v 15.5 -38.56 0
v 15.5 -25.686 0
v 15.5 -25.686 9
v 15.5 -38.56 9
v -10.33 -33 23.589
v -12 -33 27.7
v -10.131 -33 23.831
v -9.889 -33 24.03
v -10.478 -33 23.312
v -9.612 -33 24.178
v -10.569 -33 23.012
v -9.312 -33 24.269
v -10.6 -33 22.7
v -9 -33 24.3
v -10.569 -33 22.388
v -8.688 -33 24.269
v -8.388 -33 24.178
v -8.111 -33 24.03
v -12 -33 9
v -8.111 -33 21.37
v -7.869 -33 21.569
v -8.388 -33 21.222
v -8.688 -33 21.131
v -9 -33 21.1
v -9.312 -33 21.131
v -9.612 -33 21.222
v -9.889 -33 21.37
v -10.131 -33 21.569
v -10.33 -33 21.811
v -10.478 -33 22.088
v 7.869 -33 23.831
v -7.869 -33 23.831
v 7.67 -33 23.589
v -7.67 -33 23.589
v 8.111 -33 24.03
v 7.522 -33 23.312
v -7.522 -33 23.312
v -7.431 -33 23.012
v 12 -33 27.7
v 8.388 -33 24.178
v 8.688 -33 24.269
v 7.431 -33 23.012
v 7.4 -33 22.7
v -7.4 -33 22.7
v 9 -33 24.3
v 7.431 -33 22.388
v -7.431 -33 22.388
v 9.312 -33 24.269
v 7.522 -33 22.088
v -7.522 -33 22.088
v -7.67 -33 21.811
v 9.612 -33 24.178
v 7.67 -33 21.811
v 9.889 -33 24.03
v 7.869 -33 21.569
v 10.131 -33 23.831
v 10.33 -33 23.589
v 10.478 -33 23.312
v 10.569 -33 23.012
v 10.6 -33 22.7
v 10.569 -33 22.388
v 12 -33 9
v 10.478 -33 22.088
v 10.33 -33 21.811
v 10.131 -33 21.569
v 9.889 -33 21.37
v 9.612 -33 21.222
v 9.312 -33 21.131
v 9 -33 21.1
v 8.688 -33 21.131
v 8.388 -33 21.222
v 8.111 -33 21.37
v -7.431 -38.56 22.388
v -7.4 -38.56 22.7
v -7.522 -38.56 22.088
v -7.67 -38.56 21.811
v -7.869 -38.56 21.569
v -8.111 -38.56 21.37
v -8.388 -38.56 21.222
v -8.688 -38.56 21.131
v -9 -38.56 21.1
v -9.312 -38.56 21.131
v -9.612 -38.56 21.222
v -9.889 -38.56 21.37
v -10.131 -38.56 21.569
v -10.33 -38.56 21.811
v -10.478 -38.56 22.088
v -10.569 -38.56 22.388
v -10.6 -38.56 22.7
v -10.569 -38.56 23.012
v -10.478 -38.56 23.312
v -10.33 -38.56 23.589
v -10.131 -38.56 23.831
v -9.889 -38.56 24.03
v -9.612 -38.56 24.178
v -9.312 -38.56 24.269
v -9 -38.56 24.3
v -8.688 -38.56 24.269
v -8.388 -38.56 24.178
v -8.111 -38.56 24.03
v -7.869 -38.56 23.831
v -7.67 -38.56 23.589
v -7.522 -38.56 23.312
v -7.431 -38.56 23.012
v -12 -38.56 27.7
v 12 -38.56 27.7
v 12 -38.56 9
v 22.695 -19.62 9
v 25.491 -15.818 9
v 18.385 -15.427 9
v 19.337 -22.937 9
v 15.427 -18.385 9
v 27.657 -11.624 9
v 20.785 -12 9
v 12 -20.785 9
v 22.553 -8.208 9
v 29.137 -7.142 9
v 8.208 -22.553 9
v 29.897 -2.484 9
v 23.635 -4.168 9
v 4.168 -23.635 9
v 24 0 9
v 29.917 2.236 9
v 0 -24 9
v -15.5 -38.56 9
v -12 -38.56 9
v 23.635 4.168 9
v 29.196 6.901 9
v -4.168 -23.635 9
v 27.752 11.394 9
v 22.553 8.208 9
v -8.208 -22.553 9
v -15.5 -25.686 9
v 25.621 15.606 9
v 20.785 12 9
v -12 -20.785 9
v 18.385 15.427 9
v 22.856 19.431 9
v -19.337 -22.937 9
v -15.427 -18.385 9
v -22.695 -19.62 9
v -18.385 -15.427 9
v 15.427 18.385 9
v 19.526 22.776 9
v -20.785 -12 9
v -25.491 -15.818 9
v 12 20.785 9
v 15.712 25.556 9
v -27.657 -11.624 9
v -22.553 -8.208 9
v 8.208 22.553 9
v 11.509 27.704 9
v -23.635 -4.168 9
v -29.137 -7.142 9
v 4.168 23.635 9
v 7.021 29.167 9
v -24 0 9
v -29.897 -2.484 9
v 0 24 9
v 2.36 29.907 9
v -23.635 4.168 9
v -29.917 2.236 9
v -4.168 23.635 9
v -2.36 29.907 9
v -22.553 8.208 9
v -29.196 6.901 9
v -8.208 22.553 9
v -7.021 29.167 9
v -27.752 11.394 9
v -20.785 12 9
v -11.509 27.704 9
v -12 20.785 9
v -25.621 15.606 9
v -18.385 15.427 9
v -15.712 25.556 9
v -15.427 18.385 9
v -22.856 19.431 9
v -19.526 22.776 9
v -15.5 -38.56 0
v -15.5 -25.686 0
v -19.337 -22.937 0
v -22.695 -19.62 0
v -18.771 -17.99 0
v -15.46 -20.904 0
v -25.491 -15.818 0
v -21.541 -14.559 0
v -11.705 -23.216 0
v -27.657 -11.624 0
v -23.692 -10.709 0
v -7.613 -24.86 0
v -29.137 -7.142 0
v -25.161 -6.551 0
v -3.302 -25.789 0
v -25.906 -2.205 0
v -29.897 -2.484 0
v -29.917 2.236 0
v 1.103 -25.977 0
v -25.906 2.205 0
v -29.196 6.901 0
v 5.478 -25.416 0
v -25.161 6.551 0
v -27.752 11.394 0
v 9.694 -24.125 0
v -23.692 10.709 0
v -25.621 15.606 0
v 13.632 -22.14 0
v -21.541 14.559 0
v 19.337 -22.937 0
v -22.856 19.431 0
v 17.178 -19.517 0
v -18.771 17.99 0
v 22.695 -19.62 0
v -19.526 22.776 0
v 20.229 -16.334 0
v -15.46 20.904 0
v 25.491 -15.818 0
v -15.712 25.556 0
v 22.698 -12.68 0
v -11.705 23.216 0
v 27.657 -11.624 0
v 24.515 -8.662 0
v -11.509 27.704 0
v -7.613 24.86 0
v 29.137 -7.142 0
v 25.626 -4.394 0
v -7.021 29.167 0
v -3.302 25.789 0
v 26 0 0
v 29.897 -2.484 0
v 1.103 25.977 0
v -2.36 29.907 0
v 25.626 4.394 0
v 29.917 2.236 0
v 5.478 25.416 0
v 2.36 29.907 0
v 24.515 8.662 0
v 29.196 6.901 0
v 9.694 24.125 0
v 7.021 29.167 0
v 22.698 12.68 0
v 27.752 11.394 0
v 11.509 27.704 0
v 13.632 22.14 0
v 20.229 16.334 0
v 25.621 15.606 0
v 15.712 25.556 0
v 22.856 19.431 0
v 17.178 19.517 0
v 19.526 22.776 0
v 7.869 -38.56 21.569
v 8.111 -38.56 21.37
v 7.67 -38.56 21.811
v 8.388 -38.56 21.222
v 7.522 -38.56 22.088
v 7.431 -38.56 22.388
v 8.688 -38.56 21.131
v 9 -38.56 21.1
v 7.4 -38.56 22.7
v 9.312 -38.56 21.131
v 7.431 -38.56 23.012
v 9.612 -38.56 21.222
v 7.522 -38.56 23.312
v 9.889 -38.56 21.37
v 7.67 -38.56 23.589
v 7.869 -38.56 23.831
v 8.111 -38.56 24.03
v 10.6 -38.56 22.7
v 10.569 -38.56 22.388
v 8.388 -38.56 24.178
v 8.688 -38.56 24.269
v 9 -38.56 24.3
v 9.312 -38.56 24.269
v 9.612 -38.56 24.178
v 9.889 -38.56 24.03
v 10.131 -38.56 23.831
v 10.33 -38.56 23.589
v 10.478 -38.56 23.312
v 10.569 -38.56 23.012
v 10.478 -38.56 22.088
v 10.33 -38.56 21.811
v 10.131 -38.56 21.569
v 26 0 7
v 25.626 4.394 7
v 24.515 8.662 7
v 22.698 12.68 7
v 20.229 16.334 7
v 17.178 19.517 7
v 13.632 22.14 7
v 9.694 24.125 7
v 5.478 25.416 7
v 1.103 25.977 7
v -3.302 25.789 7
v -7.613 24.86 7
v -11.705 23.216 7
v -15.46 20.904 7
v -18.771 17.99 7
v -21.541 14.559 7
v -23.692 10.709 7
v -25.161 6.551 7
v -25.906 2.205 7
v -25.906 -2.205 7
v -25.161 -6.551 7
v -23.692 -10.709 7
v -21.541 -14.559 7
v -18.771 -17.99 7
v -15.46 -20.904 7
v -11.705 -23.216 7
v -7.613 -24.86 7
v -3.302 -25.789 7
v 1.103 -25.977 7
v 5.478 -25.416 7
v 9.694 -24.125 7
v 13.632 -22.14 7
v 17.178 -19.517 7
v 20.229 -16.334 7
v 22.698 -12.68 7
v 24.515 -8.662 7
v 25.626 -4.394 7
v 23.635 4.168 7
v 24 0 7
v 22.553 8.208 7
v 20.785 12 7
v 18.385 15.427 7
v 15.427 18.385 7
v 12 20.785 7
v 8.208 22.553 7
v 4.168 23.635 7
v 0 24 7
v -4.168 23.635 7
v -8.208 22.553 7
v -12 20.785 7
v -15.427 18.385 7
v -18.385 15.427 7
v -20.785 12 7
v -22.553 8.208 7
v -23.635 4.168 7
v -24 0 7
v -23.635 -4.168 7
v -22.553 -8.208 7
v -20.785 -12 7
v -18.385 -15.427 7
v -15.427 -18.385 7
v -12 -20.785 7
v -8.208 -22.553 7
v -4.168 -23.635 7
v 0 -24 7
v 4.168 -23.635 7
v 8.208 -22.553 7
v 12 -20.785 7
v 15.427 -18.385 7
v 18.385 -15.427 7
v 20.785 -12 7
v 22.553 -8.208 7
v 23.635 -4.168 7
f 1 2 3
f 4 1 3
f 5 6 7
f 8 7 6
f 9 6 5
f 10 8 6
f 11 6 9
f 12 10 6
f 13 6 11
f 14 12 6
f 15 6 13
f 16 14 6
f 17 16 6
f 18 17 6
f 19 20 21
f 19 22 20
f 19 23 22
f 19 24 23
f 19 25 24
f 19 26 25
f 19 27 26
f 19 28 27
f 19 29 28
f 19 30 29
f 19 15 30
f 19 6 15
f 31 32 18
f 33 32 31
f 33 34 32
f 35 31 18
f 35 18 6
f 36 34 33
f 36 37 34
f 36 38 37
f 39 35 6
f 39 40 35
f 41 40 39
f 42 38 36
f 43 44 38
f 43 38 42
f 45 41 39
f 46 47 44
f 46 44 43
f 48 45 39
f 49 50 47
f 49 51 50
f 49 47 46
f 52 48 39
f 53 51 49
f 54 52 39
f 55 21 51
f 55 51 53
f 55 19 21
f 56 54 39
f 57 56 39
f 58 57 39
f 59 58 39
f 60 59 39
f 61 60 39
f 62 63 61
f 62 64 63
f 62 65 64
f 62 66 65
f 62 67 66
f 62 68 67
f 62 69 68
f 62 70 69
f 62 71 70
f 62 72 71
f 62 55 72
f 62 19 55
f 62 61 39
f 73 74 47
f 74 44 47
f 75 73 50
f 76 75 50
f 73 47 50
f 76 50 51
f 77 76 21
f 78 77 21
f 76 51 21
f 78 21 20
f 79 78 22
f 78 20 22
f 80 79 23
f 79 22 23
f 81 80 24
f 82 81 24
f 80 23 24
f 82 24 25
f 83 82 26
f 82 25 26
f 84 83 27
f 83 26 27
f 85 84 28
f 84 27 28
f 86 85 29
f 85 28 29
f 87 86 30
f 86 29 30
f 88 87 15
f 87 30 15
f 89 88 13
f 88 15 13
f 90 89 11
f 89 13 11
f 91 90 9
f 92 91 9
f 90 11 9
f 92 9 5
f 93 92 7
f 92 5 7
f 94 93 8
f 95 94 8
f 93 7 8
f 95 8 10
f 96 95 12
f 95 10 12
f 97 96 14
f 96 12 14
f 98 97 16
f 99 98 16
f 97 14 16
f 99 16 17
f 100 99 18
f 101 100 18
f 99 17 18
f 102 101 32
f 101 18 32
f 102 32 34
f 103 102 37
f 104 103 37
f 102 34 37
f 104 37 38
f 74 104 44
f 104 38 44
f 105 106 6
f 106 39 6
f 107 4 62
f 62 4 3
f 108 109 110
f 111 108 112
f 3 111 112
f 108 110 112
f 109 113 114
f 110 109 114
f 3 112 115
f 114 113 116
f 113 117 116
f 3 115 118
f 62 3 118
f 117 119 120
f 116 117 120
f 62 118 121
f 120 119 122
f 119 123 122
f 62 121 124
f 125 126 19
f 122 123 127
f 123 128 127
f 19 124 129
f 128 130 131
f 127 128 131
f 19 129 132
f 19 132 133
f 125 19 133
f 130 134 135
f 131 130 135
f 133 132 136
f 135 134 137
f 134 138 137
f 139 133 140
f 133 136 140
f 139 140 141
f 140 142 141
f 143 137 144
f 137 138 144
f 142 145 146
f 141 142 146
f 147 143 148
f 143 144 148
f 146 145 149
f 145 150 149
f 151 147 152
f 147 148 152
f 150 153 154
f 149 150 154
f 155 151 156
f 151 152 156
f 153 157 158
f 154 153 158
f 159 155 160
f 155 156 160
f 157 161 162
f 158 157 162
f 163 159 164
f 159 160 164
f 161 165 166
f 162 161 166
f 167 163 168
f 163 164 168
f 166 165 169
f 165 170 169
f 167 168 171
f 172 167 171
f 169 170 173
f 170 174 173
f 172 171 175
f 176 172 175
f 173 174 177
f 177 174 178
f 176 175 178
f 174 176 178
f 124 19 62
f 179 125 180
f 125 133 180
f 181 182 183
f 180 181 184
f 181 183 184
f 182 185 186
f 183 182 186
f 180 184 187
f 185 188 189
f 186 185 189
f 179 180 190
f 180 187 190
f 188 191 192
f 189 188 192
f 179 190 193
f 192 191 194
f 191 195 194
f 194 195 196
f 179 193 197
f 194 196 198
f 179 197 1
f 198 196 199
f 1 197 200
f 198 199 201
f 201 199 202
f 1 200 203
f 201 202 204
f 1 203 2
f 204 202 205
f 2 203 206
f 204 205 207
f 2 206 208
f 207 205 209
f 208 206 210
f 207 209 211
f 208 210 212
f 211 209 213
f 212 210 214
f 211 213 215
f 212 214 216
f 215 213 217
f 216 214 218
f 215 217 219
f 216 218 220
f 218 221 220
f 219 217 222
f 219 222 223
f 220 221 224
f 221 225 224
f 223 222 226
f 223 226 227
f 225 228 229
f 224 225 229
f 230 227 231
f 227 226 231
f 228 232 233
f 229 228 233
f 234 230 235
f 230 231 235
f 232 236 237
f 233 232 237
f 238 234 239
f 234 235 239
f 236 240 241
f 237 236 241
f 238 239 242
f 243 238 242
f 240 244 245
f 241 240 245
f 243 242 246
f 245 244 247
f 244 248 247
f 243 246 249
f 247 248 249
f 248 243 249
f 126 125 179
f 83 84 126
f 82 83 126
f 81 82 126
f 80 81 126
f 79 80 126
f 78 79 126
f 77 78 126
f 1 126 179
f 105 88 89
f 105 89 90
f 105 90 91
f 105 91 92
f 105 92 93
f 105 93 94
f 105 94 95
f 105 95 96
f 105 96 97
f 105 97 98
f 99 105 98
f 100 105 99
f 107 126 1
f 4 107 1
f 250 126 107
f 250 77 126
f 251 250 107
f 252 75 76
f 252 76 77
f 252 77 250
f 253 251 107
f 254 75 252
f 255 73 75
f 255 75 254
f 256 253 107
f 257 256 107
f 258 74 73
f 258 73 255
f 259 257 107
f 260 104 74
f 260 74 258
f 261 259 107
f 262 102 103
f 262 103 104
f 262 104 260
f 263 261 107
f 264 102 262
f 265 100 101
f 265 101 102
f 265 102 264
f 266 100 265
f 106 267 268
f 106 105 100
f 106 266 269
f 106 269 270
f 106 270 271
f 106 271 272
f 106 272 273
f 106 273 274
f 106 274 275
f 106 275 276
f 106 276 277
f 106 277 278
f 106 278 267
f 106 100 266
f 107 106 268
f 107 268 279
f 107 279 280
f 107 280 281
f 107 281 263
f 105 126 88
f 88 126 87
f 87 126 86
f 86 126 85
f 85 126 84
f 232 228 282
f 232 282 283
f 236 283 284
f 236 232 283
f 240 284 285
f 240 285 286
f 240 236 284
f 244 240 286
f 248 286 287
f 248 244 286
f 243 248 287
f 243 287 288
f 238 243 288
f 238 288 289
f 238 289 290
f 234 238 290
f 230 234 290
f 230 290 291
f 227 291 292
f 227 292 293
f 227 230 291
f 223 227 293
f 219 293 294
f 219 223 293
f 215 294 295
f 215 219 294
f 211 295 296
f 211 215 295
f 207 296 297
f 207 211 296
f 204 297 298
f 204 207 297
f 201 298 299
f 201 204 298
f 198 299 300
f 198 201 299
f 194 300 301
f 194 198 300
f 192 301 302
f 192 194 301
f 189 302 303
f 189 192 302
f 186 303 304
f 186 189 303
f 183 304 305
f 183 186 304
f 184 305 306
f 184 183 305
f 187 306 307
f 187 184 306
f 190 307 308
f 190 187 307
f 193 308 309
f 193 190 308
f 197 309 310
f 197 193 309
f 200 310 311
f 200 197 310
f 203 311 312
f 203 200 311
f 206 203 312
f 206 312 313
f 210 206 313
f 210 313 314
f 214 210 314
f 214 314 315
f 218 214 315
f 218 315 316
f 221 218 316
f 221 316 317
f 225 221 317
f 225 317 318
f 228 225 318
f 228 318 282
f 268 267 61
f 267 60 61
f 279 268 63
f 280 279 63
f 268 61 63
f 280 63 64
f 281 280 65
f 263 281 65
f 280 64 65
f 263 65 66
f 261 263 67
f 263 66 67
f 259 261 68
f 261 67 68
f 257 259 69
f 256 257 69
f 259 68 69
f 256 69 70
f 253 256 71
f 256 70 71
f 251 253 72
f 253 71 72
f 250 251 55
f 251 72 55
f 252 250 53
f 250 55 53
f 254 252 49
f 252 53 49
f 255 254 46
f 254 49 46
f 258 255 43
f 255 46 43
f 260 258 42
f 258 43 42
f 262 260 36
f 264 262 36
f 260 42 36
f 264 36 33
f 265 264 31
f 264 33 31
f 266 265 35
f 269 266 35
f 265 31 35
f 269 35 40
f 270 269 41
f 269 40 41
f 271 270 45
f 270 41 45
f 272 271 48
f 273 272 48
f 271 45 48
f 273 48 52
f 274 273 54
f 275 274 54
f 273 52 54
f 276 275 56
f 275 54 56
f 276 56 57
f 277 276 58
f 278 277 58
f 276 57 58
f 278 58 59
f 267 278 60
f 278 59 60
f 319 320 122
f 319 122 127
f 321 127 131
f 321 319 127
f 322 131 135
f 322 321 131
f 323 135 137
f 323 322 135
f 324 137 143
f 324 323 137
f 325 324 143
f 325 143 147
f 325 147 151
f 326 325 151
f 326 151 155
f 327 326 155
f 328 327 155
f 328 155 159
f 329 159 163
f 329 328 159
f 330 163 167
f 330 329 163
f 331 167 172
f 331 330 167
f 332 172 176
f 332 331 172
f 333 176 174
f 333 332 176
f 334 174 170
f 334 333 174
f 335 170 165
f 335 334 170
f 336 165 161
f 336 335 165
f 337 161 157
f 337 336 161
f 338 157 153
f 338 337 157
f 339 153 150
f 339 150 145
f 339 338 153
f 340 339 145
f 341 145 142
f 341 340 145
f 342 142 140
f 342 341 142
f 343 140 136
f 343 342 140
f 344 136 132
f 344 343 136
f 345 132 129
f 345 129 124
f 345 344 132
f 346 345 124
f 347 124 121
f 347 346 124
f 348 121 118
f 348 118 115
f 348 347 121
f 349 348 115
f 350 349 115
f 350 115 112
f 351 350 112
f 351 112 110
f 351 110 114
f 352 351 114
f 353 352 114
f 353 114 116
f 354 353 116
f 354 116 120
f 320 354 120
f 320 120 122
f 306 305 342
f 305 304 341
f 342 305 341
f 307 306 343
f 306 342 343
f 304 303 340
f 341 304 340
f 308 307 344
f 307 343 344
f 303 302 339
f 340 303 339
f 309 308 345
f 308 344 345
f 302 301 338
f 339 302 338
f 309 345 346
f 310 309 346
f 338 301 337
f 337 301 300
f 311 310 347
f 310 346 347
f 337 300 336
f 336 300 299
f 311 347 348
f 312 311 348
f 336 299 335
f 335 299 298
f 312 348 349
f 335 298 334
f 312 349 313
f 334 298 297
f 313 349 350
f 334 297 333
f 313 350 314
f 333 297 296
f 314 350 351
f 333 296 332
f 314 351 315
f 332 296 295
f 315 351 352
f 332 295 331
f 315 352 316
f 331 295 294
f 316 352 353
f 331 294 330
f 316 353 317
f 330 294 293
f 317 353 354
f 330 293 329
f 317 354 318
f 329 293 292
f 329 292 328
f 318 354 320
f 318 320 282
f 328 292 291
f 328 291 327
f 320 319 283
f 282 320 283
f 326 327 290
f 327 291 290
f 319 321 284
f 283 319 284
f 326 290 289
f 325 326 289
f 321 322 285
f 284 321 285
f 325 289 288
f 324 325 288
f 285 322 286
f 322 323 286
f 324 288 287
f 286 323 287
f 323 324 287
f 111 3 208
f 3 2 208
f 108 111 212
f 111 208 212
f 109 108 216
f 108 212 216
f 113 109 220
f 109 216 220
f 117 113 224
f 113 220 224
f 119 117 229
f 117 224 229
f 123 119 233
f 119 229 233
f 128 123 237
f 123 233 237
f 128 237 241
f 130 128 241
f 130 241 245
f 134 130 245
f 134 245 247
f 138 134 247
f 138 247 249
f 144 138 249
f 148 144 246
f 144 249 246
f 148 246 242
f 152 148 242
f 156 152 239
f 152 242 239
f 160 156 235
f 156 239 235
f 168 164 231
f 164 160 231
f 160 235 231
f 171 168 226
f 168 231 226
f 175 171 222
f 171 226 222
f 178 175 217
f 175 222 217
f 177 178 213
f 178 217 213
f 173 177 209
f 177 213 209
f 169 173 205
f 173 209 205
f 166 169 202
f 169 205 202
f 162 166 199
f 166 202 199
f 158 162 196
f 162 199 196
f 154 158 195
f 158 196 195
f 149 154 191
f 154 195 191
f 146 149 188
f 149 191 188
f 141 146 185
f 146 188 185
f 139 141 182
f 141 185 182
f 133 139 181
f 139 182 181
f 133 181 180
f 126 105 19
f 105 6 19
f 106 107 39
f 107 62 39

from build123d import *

# Parameters (mm, degrees)
SKETCH_1_R          = 26
EXTRUDE_1_DEPTH     = 7
SKETCH_4_R          = 30
SKETCH_4_R_2        = 24
EXTRUDE_4_DEPTH     = 2
SKETCH_5_W          = 24
SKETCH_5_H          = 5
EXTRUDE_5_DEPTH     = 20.7
EXTRUDE_8_DEPTH     = 2
SKETCH_9_R          = 1.6
CUT_EXTRUDE_1_DEPTH = 6
EXTRUDE_9_DEPTH     = 0.56
SKETCH_11_R         = 1.6
CUT_EXTRUDE_2_DEPTH = 25


with BuildPart() as part:
    # 草图1 → 凸台-拉伸1 (new body)
    with BuildSketch(Plane.XY):
        with BuildLine():
            Line((-15.5, -38), (15.5, -38))
            Line((15.5, -38), (15.5, -25.685599078))
            ThreePointArc((15.5, -25.685599078), (0, 30), (-15.5, -25.685599078))
            Line((-15.5, -25.685599078), (-15.5, -38))
        make_face()
        Circle(SKETCH_1_R, mode=Mode.SUBTRACT)
    extrude(amount=EXTRUDE_1_DEPTH)

    # 草图4 → 凸台-拉伸4 (add)
    with BuildSketch(Plane.XY.offset(7)):
        Circle(SKETCH_4_R)
        Circle(SKETCH_4_R_2, mode=Mode.SUBTRACT)
    extrude(amount=EXTRUDE_4_DEPTH)

    # 草图5 → 凸台-拉伸5 (add)
    with BuildSketch(Plane.XY.offset(7)):
        with Locations((0, -35.5)):
            Rectangle(SKETCH_5_W, SKETCH_5_H)
    extrude(amount=EXTRUDE_5_DEPTH)

    # 草图6 → 凸台-拉伸8 (add)
    with BuildSketch(Plane.XY.offset(7)):
        with BuildLine():
            Line((15.5, -38), (15.5, -25.685599078))
            ThreePointArc((15.5, -25.685599078), (0, -30), (-15.5, -25.685599078))
            Line((-15.5, -25.685599078), (-15.5, -38))
            Line((-15.5, -38), (-12, -38))
            Line((-12, -38), (-12, -33))
            Line((-12, -33), (12, -33))
            Line((12, -33), (12, -38))
            Line((12, -38), (15.5, -38))
        make_face()
    extrude(amount=EXTRUDE_8_DEPTH)

    # 草图9 → 切除-拉伸1 (cut, through all)
    with BuildSketch(Plane(origin=(0, -33, 0), x_dir=(1, 0, 0), z_dir=(0, 1, 0))):
        with Locations((-9, -22.7)):
            Circle(SKETCH_9_R)
        with Locations((9, -22.7)):
            Circle(SKETCH_9_R)
    extrude(amount=-CUT_EXTRUDE_1_DEPTH, mode=Mode.SUBTRACT)

    # 草图10 → 凸台-拉伸9 (add)
    with BuildSketch(Plane.XZ.offset(38)):
        Polygon((15.5, 0), (15.5, 9), (12, 9), (12, 27.7), (-12, 27.7), (-12, 9), (-15.5, 9), (-15.5, 0), align=None)
    extrude(amount=EXTRUDE_9_DEPTH)

    # 草图11 → 切除-拉伸2 (cut)
    with BuildSketch(Plane(origin=(0, -33, 0), x_dir=(1, 0, 0), z_dir=(0, 1, 0))):
        with Locations((9, -22.7)):
            Circle(SKETCH_11_R)
        with Locations((-9, -22.7)):
            Circle(SKETCH_11_R)
    extrude(amount=-CUT_EXTRUDE_2_DEPTH, mode=Mode.SUBTRACT)


solid = part.part
